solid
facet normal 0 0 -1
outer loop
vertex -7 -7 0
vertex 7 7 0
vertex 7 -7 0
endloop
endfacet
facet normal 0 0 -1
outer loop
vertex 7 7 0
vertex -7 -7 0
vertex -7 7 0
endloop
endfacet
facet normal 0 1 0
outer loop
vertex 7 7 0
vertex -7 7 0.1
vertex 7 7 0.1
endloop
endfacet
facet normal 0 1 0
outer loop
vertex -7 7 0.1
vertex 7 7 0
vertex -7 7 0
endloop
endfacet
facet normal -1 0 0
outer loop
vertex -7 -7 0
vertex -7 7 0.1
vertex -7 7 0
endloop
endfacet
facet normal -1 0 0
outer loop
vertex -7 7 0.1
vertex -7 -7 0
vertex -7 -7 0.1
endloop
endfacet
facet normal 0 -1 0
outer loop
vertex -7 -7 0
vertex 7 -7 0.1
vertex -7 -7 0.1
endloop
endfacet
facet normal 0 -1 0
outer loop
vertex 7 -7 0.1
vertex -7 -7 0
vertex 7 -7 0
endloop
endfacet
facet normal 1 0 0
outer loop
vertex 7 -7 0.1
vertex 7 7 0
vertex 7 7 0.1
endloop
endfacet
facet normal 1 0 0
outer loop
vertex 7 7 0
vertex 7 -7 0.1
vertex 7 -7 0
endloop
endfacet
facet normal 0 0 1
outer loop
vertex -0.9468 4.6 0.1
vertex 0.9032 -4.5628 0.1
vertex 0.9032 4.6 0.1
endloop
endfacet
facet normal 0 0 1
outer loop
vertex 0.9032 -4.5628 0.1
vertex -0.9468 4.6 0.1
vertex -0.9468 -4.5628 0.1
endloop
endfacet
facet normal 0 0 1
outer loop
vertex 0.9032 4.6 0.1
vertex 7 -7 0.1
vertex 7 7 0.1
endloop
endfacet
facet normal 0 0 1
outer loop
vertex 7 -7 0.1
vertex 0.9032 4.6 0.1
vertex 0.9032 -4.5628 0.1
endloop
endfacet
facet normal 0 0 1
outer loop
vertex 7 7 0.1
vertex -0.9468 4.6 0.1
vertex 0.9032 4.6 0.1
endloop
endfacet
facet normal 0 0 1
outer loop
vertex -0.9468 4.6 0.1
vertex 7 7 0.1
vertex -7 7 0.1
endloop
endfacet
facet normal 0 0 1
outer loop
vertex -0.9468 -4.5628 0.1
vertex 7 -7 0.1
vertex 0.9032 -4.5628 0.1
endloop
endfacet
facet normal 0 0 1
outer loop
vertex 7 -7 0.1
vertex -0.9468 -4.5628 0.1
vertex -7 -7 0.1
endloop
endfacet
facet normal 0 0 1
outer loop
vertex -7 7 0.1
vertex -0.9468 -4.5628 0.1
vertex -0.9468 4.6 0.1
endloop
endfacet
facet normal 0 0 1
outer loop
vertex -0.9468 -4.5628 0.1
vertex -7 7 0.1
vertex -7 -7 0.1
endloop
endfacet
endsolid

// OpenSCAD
// file: ../p/box5-12.scad
use <../lib.scad>
function ldraw_lib__box5_12() = [
// 0 Box with 5 Faces without Any Edges
// 0 Name: box5-12.dat
// 0 Author: Chris Dee [cwdee]
// 0 !LDRAW_ORG Primitive UPDATE 2009-02
// 0 !LICENSE Licensed under CC BY 2.0 and CC BY 4.0 : see CAreadme.txt
// 
// 0 BFC CERTIFY CCW
  [0,"BFC","CERTIFY"],
  [0,"BFC","CCW"],
// 
// 0 !HISTORY 2009-09-03 [PTadmin] Official Update 2009-02
// 
// 
// 4 16 1 1 1 1 1 -1 -1 1 -1 -1 1 1
  [4,16,1,1,1,1,1,-1,-1,1,-1,-1,1,1],
// 4 16 -1 0 1 1 0 1 1 1 1 -1 1 1
  [4,16,-1,0,1,1,0,1,1,1,1,-1,1,1],
// 4 16 -1 0 -1 -1 0 1 -1 1 1 -1 1 -1
  [4,16,-1,0,-1,-1,0,1,-1,1,1,-1,1,-1],
// 4 16 1 0 -1 -1 0 -1 -1 1 -1 1 1 -1
  [4,16,1,0,-1,-1,0,-1,-1,1,-1,1,1,-1],
// 4 16 1 0 1 1 0 -1 1 1 -1 1 1 1
  [4,16,1,0,1,1,0,-1,1,1,-1,1,1,1],
// 0
];
makepoly(ldraw_lib__box5_12(), line=0.2);
// main file
use <../lib.scad>
use <../p/box5-12.scad>
function ldraw_lib__4521703p() = [
// 0 Sticker  1.7 x  1.7 with Dark_Red "I"
// 0 Name: 4521703p.dat
// 0 Author: J.C. Tchang [tchang]
// 0 !LDRAW_ORG Part UPDATE 2011-01
// 0 !LICENSE Licensed under CC BY 2.0 and CC BY 4.0 : see CAreadme.txt
// 
// 0 BFC CERTIFY CCW
  [0,"BFC","CERTIFY"],
  [0,"BFC","CCW"],
// 
// 0 !HISTORY 2011-07-25 [PTadmin] Official Update 2011-01
// 
// 
// 1 15 0 -0.25 0 17.5 0 0 0 0.25 0 0 0 17.5 box5-12.dat
  [1,15,0,-0.25,0,17.5,0,0,0,0.25,0,0,0,17.5, ldraw_lib__box5_12()],
// 0 //
// 4 320 2.258 -0.25 -11.407 2.258 -0.25 11.5 -2.367 -0.25 11.5 -2.367 -0.25 -11.407
  [4,320,2.258,-0.25,-11.407,2.258,-0.25,11.5,-2.367,-0.25,11.5,-2.367,-0.25,-11.407],
// 4 15 17.5 -0.25 -17.5 17.5 -0.25 17.5 2.258 -0.25 11.5 2.258 -0.25 -11.407
  [4,15,17.5,-0.25,-17.5,17.5,-0.25,17.5,2.258,-0.25,11.5,2.258,-0.25,-11.407],
// 4 15 2.258 -0.25 11.5 17.5 -0.25 17.5 -17.5 -0.25 17.5 -2.367 -0.25 11.5
  [4,15,2.258,-0.25,11.5,17.5,-0.25,17.5,-17.5,-0.25,17.5,-2.367,-0.25,11.5],
// 4 15 -17.5 -0.25 -17.5 17.5 -0.25 -17.5 2.258 -0.25 -11.407 -2.367 -0.25 -11.407
  [4,15,-17.5,-0.25,-17.5,17.5,-0.25,-17.5,2.258,-0.25,-11.407,-2.367,-0.25,-11.407],
// 4 15 -2.367 -0.25 11.5 -17.5 -0.25 17.5 -17.5 -0.25 -17.5 -2.367 -0.25 -11.407
  [4,15,-2.367,-0.25,11.5,-17.5,-0.25,17.5,-17.5,-0.25,-17.5,-2.367,-0.25,-11.407],
// 0 //
];
makepoly(ldraw_lib__4521703p(), line=0.2);
